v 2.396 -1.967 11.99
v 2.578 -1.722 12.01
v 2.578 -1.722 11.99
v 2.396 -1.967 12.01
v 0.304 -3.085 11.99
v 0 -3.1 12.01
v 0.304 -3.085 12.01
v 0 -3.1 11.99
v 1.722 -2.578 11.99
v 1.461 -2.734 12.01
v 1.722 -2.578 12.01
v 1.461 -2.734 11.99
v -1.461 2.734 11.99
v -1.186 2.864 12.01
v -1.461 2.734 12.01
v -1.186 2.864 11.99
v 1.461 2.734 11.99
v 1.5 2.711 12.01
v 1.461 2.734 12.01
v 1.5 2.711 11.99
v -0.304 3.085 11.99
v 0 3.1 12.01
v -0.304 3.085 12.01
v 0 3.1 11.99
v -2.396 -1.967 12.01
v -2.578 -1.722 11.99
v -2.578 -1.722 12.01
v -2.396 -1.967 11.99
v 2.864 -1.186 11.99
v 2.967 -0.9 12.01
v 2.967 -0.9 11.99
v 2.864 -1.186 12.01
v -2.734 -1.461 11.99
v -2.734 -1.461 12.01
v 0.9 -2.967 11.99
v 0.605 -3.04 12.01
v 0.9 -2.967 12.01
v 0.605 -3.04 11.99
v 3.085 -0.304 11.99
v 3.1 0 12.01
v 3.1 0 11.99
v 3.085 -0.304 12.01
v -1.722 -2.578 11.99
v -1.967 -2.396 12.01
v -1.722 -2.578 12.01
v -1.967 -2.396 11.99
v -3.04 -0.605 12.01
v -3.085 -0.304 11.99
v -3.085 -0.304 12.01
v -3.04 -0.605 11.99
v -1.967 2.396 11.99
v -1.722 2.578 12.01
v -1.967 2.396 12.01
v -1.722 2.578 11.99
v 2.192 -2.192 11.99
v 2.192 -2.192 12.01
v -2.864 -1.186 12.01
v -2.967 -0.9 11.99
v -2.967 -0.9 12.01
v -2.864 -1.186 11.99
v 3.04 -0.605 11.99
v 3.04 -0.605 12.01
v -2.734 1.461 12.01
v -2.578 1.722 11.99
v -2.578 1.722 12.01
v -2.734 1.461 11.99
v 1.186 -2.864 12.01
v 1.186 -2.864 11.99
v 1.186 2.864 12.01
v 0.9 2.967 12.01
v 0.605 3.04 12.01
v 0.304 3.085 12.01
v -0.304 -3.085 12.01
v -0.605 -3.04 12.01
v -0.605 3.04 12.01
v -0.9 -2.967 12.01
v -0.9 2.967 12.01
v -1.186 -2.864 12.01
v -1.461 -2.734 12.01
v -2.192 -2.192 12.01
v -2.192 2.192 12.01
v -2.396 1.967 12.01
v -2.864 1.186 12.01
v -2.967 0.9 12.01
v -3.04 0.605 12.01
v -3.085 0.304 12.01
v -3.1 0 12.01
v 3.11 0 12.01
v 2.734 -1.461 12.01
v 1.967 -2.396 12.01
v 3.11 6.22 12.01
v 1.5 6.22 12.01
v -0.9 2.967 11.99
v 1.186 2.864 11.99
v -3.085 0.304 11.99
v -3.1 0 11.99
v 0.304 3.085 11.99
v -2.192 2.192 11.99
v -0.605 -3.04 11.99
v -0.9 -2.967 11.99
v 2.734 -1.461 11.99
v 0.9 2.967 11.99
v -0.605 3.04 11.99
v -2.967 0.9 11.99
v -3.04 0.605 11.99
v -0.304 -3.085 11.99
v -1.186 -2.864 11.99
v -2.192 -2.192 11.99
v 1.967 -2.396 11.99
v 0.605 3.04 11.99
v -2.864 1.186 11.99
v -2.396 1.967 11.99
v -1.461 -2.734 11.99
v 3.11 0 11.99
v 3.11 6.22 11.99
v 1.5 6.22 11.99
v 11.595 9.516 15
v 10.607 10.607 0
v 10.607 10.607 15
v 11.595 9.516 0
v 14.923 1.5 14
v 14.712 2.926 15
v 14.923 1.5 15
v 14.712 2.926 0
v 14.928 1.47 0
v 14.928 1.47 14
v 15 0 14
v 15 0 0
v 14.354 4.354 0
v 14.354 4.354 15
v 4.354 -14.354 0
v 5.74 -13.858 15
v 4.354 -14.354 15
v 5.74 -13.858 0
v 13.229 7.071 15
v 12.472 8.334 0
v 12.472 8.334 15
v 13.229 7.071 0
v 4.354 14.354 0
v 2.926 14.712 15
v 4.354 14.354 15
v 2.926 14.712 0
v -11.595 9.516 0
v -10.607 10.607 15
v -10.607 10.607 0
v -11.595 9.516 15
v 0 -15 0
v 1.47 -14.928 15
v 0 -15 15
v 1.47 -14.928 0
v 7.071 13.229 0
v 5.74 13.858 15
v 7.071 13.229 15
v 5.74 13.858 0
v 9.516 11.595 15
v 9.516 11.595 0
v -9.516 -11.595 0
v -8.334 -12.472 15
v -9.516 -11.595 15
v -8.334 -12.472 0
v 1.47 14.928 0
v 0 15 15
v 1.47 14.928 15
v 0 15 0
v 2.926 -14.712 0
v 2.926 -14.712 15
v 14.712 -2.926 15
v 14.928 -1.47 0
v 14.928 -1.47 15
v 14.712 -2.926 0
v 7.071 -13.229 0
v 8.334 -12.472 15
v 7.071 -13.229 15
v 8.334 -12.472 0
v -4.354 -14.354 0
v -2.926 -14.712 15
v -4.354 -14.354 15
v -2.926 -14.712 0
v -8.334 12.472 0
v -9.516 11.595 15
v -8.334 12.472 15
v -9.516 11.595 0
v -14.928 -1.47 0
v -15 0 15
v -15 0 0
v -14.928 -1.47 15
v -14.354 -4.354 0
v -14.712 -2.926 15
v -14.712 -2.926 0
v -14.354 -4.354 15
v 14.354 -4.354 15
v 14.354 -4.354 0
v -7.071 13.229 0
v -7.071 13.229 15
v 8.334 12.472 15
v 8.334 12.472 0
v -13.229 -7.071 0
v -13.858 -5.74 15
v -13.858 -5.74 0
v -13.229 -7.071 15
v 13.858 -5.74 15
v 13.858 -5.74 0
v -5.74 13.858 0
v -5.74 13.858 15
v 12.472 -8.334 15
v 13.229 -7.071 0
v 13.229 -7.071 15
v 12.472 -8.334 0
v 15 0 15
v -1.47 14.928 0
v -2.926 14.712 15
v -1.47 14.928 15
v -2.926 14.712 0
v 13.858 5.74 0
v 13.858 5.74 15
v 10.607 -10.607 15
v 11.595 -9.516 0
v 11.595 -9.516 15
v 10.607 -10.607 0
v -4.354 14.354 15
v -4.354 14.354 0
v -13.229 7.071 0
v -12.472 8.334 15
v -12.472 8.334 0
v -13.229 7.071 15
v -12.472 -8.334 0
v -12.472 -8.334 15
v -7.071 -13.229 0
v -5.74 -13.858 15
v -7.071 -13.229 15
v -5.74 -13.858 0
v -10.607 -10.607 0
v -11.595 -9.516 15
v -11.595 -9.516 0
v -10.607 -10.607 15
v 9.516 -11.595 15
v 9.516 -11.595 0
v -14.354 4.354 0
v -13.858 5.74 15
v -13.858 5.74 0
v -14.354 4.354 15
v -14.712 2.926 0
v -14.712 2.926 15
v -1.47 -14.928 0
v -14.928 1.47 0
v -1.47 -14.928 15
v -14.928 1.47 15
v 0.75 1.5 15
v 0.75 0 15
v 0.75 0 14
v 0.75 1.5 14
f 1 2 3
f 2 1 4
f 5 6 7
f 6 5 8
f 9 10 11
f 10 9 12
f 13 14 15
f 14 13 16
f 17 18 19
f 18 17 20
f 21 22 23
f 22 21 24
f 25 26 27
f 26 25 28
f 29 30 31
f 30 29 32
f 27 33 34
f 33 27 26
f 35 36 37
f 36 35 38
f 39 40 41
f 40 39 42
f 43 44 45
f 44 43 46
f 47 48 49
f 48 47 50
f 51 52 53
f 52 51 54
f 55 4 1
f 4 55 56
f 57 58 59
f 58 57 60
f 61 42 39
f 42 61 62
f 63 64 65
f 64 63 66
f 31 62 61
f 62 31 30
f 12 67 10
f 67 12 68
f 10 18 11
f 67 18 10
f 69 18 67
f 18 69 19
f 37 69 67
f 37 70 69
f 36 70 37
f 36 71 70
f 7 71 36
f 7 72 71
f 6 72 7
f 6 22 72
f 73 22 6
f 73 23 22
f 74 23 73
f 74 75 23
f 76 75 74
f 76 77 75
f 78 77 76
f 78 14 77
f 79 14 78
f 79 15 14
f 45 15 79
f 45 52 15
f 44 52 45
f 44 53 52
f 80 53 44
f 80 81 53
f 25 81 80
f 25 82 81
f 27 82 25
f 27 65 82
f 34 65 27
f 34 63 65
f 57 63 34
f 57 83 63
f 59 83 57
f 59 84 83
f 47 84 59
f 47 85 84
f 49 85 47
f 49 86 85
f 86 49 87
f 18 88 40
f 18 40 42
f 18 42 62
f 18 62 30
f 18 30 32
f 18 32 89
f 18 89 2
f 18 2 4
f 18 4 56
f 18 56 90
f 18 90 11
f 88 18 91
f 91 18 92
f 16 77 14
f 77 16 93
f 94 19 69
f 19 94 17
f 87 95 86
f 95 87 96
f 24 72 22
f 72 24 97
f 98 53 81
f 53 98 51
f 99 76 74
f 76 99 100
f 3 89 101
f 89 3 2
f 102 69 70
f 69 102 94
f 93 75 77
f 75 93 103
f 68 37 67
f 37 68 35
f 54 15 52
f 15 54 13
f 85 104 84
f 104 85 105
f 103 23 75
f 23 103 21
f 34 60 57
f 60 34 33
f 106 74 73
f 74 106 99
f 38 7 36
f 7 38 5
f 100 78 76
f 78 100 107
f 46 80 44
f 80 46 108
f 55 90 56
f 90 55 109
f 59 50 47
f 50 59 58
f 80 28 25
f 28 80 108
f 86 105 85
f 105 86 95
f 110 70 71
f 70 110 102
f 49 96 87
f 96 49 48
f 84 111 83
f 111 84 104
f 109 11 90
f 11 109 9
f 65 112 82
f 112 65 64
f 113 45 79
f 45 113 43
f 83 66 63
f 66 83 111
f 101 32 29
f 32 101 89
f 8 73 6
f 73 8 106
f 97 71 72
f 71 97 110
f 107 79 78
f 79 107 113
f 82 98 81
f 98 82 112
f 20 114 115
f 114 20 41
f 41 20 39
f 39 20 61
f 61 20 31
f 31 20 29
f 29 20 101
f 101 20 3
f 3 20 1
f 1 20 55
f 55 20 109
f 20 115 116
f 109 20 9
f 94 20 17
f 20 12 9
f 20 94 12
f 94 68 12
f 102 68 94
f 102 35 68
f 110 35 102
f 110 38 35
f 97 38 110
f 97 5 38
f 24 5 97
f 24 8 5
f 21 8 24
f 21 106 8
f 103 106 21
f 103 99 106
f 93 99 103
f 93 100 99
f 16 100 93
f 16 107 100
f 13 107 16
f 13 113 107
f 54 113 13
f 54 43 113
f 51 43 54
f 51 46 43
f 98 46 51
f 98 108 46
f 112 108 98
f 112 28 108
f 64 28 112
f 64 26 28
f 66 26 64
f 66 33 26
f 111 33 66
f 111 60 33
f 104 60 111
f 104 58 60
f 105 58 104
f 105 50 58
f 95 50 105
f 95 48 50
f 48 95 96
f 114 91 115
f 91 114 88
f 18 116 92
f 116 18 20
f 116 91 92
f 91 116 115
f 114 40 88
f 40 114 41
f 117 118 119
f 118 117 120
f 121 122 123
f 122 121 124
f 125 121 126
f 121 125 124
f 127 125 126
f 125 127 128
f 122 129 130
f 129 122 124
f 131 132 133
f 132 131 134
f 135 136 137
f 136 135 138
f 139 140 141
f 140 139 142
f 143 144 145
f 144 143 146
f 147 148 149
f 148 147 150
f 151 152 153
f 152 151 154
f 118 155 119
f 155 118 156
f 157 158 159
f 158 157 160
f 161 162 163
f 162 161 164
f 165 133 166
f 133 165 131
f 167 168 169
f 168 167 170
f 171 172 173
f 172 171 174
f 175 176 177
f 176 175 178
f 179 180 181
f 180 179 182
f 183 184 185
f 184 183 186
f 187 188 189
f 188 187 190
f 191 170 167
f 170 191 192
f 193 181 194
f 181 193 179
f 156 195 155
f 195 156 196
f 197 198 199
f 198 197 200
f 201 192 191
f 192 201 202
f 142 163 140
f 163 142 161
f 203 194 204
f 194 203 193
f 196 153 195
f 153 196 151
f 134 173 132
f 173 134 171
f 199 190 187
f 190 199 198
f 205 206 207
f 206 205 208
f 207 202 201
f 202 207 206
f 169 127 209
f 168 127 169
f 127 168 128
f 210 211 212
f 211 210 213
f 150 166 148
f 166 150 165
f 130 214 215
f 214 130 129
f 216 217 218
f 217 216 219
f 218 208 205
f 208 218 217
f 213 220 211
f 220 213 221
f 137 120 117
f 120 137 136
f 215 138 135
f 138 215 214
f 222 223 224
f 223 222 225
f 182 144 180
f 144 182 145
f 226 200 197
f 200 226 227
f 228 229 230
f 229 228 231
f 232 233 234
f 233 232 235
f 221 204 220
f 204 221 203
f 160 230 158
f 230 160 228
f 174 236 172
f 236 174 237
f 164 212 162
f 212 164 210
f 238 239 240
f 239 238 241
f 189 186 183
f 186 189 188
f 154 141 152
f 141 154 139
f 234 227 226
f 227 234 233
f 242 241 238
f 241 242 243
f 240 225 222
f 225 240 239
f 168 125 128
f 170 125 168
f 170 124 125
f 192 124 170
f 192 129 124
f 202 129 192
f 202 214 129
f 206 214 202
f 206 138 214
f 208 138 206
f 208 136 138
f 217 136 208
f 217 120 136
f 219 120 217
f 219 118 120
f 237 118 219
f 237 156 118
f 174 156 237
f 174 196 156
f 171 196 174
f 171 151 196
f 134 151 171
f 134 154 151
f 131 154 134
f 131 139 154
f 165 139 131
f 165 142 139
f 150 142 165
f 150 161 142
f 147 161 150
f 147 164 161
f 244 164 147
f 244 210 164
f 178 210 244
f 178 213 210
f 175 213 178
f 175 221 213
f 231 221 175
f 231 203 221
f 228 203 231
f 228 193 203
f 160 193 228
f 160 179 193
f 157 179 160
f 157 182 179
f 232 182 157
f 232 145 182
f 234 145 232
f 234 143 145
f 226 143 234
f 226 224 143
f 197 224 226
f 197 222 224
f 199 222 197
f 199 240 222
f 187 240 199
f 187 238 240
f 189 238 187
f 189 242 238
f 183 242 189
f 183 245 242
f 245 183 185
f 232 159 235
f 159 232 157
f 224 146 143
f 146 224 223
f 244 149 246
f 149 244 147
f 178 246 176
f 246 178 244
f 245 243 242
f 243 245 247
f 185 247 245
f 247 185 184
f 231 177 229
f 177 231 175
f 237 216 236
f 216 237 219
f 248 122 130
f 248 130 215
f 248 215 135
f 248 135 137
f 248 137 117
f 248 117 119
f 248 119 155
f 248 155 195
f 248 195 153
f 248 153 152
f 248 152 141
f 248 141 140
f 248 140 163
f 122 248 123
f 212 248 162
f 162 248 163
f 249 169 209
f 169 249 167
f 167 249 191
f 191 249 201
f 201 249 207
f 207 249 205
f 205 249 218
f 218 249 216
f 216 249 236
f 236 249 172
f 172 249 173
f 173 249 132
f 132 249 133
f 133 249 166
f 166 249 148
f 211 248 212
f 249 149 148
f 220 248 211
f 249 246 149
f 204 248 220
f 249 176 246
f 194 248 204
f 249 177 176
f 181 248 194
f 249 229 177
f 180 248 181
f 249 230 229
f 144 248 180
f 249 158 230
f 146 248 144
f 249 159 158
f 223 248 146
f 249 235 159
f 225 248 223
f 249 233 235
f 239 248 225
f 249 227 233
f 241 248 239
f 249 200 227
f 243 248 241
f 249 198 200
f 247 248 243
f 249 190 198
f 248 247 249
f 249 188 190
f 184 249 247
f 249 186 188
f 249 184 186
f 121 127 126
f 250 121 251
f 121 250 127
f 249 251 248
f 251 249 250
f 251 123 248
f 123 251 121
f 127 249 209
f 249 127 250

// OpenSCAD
// Replacement knob for hotplate stirrer
// D-shaft: 6 mm, Knob: 30 mm dia x 15 mm tall, printed with bottom face on bed (z=0)

// --- Knob outer dimensions ---
knob_dia = 30;           // Outer diameter of knob (mm)
knob_h = 15;             // Total height of knob (mm)
knob_r = knob_dia / 2;  // Outer radius

// --- D-shaft bore dimensions ---
shaft_dia = 6;           // Shaft diameter (mm)
bore_dia = 6.2;           // Bore diameter (slight clearance) (mm)
bore_r = bore_dia / 2;   // Bore radius
bore_depth = 12;         // Depth of blind bore from bottom (mm)
flat_to_opposite = 4.7;  // Distance from flat to opposite side of circle (mm)

// --- Calculated values ---
// For D-shape: the flat is cut such that distance from flat to opposite side = 4.7 mm
// The circle has radius 3.1 mm. The flat is at distance (3.1 - (4.7 - 3.1)) = 1.5 mm from center
// So the flat is at x = 1.5 mm (if flat is on the right side)
flat_offset = bore_r - (flat_to_opposite - bore_r);  // Distance from center to flat

// --- Grip grooves ---
num_grooves = 18;         // Number of vertical grip grooves
groove_dia = 2;           // Diameter of half-cylinder groove (mm)
groove_r = groove_dia / 2;

// --- Pointer groove ---
pointer_width = 1.5;      // Width of pointer groove (mm)
pointer_depth = 1;       // Depth of pointer groove (mm)

// --- Build the knob with all features ---
difference() {
    // Main cylinder body
    cylinder(r = knob_r, h = knob_h, $fn = 64);
    
    // Subtract D-shaped blind bore from bottom (z=0)
    // The bore goes 12mm up into the knob
    // Create the D-shape by subtracting a cylinder and then a rectangular block
    translate([0, 0, bore_depth - 0.01]) {
        // First, create the cylindrical part of the bore
        cylinder(r = bore_r, h = 0.02, $fn = 64);
        
        // Then cut the flat side to create the D-shape
        // The flat is at x = flat_offset, cutting from there to the right
        translate([flat_offset, 0, 0]) {
            // Cut a rectangular section to create the flat
            // This should remove material from x = flat_offset to x = bore_r
            cube([bore_r - flat_offset + 0.01, bore_dia + 0.02, 0.02], center = [0, 0, 0]);
        }
    }
    
    // Subtract vertical grip grooves (half-cylinders on outer surface)
    for (i = [0 : num_grooves - 1]) {
        angle = i * 360 / num_grooves;
        translate([cos(angle) * knob_r, sin(angle) * knob_r, 0]) {
            rotate([0, 0, angle]) {
                // Half-cylinder groove: cut from the outer surface inward
                // The groove center is on the outer surface, so we cut from r = knob_r - groove_r inward
                translate([groove_r, 0, 0]) {
                    cylinder(r = groove_r, h = knob_h + 0.02, $fn = 32);
                }
            }
        }
    }
    
    // Subtract pointer groove on top face
    // Runs from center to outer edge, on the same side as the flat of the D (positive x-axis)
    translate([0, 0, knob_h - pointer_depth]) {
        // Rectangular groove from center to edge
        translate([pointer_width / 2, 0, 0]) {
            cube([knob_r, pointer_width, pointer_depth + 0.01], center = [0, 0, 0]);
        }
    }
}
